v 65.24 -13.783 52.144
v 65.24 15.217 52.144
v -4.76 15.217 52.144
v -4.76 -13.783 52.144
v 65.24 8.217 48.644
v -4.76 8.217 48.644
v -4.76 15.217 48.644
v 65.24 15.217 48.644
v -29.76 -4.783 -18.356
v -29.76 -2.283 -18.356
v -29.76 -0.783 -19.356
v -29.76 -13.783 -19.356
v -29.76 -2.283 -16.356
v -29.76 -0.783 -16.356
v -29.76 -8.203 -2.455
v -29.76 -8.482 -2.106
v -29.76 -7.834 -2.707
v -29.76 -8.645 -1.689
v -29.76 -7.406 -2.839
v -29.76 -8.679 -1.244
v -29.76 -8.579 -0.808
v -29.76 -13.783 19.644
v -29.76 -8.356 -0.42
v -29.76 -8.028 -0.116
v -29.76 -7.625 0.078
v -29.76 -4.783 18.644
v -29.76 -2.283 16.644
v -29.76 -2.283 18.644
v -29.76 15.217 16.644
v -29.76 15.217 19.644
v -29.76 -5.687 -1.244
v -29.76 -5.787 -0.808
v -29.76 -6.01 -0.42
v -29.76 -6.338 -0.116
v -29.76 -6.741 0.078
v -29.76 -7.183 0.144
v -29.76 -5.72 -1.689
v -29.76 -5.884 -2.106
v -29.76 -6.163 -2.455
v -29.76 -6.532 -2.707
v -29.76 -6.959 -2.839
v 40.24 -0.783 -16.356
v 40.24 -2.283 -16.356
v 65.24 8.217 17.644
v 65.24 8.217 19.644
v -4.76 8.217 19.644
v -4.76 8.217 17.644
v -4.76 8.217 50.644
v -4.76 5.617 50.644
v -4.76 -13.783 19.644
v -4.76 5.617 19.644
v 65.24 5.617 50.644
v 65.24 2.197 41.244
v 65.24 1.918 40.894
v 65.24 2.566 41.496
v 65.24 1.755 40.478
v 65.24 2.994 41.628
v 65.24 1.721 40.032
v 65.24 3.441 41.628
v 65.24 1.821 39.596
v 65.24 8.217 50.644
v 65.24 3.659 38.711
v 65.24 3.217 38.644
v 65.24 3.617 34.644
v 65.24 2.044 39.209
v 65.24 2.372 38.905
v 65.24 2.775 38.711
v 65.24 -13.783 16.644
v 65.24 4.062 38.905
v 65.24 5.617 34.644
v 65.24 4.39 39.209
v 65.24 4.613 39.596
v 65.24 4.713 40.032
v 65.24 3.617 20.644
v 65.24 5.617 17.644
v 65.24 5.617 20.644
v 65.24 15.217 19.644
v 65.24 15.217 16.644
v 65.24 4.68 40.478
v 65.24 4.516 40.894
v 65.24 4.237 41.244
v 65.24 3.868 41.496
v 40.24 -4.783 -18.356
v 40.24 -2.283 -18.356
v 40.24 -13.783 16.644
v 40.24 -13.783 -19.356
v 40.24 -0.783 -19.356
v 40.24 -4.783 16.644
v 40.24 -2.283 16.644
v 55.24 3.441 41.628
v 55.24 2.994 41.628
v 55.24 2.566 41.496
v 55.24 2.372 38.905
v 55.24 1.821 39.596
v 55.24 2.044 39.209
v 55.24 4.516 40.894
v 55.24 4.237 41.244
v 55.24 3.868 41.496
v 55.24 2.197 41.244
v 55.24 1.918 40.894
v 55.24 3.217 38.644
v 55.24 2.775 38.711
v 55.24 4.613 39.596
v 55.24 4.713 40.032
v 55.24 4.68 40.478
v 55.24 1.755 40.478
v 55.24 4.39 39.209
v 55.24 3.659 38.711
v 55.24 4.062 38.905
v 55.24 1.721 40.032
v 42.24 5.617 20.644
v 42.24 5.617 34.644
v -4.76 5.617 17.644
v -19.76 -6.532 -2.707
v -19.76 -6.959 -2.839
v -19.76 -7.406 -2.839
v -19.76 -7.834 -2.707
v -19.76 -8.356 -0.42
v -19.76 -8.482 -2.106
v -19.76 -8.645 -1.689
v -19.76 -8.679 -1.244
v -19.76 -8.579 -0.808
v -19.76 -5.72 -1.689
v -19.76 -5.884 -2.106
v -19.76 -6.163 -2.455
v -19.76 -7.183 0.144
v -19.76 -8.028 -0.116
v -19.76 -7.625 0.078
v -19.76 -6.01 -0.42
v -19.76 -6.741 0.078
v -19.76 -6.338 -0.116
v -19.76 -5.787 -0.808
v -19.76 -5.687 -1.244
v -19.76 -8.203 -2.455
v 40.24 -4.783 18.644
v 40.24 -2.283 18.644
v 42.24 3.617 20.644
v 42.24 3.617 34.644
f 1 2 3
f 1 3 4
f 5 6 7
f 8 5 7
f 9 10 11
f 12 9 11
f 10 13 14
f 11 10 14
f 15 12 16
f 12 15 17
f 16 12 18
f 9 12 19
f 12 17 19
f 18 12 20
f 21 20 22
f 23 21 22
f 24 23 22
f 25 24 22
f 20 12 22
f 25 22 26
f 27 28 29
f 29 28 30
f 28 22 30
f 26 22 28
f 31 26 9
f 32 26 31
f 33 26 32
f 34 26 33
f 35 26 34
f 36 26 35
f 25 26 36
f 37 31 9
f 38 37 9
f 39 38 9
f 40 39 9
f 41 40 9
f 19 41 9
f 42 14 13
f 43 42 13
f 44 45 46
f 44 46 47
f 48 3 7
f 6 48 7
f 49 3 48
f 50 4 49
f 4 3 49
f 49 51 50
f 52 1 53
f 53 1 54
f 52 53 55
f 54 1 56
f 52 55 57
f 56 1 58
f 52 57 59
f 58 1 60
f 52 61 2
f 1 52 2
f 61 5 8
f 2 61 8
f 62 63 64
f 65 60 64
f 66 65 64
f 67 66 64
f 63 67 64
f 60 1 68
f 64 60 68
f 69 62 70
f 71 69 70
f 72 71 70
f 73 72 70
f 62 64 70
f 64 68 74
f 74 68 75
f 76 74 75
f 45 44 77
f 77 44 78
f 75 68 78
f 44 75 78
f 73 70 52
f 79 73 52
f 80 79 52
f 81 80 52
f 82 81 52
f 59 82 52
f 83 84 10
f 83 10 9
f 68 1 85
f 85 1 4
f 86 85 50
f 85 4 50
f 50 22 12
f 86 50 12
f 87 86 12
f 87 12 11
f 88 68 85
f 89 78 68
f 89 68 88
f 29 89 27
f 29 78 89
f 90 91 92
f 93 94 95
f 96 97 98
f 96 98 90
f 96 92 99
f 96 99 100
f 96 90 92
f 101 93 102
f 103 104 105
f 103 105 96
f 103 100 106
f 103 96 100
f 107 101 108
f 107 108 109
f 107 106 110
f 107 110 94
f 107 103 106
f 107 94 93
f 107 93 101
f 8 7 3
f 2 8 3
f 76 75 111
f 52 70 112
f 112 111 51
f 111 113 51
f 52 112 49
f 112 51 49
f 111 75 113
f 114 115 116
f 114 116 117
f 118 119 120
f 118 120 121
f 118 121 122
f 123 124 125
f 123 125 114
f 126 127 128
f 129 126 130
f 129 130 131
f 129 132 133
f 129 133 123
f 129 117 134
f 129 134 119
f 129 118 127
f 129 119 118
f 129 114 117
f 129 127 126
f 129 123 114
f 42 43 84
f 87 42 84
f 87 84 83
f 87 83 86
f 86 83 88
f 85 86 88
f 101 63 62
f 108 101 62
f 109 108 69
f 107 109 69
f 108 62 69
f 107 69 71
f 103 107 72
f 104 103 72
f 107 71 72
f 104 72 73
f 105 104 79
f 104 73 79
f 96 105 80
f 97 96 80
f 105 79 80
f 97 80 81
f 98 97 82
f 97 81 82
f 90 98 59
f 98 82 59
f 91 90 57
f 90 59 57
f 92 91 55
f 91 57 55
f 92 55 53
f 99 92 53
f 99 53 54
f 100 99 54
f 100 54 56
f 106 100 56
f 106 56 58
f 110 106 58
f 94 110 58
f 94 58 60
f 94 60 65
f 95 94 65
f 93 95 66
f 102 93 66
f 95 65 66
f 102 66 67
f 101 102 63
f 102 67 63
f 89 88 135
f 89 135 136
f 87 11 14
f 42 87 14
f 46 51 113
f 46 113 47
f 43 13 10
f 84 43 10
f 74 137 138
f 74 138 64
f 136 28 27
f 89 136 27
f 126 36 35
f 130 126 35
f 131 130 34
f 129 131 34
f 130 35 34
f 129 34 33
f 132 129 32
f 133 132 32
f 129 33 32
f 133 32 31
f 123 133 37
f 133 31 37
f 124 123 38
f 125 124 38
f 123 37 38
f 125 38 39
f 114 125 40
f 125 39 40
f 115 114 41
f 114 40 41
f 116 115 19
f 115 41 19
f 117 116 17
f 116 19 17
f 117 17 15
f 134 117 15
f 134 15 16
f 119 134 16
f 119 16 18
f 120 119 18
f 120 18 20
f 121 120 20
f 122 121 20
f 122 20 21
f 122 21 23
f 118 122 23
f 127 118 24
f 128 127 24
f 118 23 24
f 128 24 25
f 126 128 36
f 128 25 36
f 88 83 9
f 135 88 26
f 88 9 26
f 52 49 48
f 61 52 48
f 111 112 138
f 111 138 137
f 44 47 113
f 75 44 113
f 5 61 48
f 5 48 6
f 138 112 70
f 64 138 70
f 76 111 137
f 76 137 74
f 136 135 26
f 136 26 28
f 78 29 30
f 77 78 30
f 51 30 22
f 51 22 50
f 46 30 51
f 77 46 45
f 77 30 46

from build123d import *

# Parameters (mm, degrees)
BOSS_EXTRUDE1_DEPTH     = 94.99986
SKETCH2_W               = 23
SKETCH2_H               = 14
CUT_EXTRUDE1_DEPTH      = 2
CUT_EXTRUDE2_DEPTH      = 86.037208991
CUT_EXTRUDE2_DEPTH_BACK = 86.037208991
SKETCH4_W               = 25
SKETCH4_H               = 32.499936
SKETCH4_W_2             = 24.99986
SKETCH4_H_2             = 36
SKETCH5_W               = 25
SKETCH5_H               = 2.6
BOSS_EXTRUDE3_DEPTH     = 2
SKETCH6_W               = 24.99986
SKETCH6_H               = 2.5
BOSS_EXTRUDE4_DEPTH     = 2
SKETCH7_R               = 1.5
CUT_EXTRUDE3_DEPTH      = 10
SKETCH8_R               = 1.5
CUT_EXTRUDE4_DEPTH      = 10


with BuildPart() as part:
    # Sketch1 → Boss-Extrude1 (new body)
    with BuildSketch(Plane.ZY.offset(29.759563114)):
        Polygon((-16.355611523, -2.282836071), (-18.355611523, -2.282836071), (-18.355611523, -4.782836071), (18.644388477, -4.782836071), (18.644388477, -2.282836071), (16.644388477, -2.282836071), (16.644388477, 15.217163929), (19.644388477, 15.217163929), (19.644388477, 8.217163929), (17.644388477, 8.217163929), (17.644388477, 5.617163929), (50.644324477, 5.617163929), (50.644324477, 8.217163929), (48.644324477, 8.217163929), (48.644324477, 15.217163929), (52.144324477, 15.217163929), (52.144324477, -13.782836071), (-19.355611523, -13.782836071), (-19.355611523, -0.782836071), (-16.355611523, -0.782836071), align=None)
    extrude(amount=-BOSS_EXTRUDE1_DEPTH)

    # Sketch2 → Cut-Extrude1 (cut)
    with BuildSketch(Plane(origin=(0, 5.617163929, 0), x_dir=(1, 0, 0), z_dir=(0, 1, 0))):
        with Locations((53.740296886, -27.644388477)):
            Rectangle(SKETCH2_W, SKETCH2_H)
    extrude(amount=-CUT_EXTRUDE1_DEPTH, mode=Mode.SUBTRACT)

    # Sketch4 → Cut-Extrude2 (cut, two sides: drawn at the far end of the back side and taken through both)
    with BuildSketch(Plane(origin=(0, -0.782836071, 0), x_dir=(1, 0, 0), z_dir=(0, 1, 0)).offset(-CUT_EXTRUDE2_DEPTH_BACK)):
        with Locations((-17.259563114, -35.894356477)):
            Rectangle(SKETCH4_W, SKETCH4_H)
        with Locations((52.740366886, 1.355611523)):
            Rectangle(SKETCH4_W_2, SKETCH4_H_2)
    extrude(amount=CUT_EXTRUDE2_DEPTH + CUT_EXTRUDE2_DEPTH_BACK, mode=Mode.SUBTRACT)

    # Sketch5 → Boss-Extrude3 (add)
    with BuildSketch(Plane.XY.offset(19.644388477)):
        with Locations((-17.259563114, 6.917163929)):
            Rectangle(SKETCH5_W, SKETCH5_H)
    extrude(amount=-BOSS_EXTRUDE3_DEPTH)

    # Sketch6 → Boss-Extrude4 (add)
    with BuildSketch(Plane(origin=(0, 0, 16.644388477), x_dir=(-1, 0, 0), z_dir=(0, 0, -1))):
        with Locations((-52.740366886, -3.532836071)):
            Rectangle(SKETCH6_W, SKETCH6_H)
    extrude(amount=-BOSS_EXTRUDE4_DEPTH)

    # Sketch7 → Cut-Extrude3 (cut)
    with BuildSketch(Plane(origin=(65.240296886, 0, 0), x_dir=(0, 0, -1), z_dir=(1, 0, 0))):
        with Locations((-40.144324477, 3.217163929)):
            Circle(SKETCH7_R)
    extrude(amount=-CUT_EXTRUDE3_DEPTH, mode=Mode.SUBTRACT)

    # Sketch8 → Cut-Extrude4 (cut)
    with BuildSketch(Plane.ZY.offset(29.759563114)):
        with Locations((-1.355611523, -7.182836071)):
            Circle(SKETCH8_R)
    extrude(amount=-CUT_EXTRUDE4_DEPTH, mode=Mode.SUBTRACT)


solid = part.part
